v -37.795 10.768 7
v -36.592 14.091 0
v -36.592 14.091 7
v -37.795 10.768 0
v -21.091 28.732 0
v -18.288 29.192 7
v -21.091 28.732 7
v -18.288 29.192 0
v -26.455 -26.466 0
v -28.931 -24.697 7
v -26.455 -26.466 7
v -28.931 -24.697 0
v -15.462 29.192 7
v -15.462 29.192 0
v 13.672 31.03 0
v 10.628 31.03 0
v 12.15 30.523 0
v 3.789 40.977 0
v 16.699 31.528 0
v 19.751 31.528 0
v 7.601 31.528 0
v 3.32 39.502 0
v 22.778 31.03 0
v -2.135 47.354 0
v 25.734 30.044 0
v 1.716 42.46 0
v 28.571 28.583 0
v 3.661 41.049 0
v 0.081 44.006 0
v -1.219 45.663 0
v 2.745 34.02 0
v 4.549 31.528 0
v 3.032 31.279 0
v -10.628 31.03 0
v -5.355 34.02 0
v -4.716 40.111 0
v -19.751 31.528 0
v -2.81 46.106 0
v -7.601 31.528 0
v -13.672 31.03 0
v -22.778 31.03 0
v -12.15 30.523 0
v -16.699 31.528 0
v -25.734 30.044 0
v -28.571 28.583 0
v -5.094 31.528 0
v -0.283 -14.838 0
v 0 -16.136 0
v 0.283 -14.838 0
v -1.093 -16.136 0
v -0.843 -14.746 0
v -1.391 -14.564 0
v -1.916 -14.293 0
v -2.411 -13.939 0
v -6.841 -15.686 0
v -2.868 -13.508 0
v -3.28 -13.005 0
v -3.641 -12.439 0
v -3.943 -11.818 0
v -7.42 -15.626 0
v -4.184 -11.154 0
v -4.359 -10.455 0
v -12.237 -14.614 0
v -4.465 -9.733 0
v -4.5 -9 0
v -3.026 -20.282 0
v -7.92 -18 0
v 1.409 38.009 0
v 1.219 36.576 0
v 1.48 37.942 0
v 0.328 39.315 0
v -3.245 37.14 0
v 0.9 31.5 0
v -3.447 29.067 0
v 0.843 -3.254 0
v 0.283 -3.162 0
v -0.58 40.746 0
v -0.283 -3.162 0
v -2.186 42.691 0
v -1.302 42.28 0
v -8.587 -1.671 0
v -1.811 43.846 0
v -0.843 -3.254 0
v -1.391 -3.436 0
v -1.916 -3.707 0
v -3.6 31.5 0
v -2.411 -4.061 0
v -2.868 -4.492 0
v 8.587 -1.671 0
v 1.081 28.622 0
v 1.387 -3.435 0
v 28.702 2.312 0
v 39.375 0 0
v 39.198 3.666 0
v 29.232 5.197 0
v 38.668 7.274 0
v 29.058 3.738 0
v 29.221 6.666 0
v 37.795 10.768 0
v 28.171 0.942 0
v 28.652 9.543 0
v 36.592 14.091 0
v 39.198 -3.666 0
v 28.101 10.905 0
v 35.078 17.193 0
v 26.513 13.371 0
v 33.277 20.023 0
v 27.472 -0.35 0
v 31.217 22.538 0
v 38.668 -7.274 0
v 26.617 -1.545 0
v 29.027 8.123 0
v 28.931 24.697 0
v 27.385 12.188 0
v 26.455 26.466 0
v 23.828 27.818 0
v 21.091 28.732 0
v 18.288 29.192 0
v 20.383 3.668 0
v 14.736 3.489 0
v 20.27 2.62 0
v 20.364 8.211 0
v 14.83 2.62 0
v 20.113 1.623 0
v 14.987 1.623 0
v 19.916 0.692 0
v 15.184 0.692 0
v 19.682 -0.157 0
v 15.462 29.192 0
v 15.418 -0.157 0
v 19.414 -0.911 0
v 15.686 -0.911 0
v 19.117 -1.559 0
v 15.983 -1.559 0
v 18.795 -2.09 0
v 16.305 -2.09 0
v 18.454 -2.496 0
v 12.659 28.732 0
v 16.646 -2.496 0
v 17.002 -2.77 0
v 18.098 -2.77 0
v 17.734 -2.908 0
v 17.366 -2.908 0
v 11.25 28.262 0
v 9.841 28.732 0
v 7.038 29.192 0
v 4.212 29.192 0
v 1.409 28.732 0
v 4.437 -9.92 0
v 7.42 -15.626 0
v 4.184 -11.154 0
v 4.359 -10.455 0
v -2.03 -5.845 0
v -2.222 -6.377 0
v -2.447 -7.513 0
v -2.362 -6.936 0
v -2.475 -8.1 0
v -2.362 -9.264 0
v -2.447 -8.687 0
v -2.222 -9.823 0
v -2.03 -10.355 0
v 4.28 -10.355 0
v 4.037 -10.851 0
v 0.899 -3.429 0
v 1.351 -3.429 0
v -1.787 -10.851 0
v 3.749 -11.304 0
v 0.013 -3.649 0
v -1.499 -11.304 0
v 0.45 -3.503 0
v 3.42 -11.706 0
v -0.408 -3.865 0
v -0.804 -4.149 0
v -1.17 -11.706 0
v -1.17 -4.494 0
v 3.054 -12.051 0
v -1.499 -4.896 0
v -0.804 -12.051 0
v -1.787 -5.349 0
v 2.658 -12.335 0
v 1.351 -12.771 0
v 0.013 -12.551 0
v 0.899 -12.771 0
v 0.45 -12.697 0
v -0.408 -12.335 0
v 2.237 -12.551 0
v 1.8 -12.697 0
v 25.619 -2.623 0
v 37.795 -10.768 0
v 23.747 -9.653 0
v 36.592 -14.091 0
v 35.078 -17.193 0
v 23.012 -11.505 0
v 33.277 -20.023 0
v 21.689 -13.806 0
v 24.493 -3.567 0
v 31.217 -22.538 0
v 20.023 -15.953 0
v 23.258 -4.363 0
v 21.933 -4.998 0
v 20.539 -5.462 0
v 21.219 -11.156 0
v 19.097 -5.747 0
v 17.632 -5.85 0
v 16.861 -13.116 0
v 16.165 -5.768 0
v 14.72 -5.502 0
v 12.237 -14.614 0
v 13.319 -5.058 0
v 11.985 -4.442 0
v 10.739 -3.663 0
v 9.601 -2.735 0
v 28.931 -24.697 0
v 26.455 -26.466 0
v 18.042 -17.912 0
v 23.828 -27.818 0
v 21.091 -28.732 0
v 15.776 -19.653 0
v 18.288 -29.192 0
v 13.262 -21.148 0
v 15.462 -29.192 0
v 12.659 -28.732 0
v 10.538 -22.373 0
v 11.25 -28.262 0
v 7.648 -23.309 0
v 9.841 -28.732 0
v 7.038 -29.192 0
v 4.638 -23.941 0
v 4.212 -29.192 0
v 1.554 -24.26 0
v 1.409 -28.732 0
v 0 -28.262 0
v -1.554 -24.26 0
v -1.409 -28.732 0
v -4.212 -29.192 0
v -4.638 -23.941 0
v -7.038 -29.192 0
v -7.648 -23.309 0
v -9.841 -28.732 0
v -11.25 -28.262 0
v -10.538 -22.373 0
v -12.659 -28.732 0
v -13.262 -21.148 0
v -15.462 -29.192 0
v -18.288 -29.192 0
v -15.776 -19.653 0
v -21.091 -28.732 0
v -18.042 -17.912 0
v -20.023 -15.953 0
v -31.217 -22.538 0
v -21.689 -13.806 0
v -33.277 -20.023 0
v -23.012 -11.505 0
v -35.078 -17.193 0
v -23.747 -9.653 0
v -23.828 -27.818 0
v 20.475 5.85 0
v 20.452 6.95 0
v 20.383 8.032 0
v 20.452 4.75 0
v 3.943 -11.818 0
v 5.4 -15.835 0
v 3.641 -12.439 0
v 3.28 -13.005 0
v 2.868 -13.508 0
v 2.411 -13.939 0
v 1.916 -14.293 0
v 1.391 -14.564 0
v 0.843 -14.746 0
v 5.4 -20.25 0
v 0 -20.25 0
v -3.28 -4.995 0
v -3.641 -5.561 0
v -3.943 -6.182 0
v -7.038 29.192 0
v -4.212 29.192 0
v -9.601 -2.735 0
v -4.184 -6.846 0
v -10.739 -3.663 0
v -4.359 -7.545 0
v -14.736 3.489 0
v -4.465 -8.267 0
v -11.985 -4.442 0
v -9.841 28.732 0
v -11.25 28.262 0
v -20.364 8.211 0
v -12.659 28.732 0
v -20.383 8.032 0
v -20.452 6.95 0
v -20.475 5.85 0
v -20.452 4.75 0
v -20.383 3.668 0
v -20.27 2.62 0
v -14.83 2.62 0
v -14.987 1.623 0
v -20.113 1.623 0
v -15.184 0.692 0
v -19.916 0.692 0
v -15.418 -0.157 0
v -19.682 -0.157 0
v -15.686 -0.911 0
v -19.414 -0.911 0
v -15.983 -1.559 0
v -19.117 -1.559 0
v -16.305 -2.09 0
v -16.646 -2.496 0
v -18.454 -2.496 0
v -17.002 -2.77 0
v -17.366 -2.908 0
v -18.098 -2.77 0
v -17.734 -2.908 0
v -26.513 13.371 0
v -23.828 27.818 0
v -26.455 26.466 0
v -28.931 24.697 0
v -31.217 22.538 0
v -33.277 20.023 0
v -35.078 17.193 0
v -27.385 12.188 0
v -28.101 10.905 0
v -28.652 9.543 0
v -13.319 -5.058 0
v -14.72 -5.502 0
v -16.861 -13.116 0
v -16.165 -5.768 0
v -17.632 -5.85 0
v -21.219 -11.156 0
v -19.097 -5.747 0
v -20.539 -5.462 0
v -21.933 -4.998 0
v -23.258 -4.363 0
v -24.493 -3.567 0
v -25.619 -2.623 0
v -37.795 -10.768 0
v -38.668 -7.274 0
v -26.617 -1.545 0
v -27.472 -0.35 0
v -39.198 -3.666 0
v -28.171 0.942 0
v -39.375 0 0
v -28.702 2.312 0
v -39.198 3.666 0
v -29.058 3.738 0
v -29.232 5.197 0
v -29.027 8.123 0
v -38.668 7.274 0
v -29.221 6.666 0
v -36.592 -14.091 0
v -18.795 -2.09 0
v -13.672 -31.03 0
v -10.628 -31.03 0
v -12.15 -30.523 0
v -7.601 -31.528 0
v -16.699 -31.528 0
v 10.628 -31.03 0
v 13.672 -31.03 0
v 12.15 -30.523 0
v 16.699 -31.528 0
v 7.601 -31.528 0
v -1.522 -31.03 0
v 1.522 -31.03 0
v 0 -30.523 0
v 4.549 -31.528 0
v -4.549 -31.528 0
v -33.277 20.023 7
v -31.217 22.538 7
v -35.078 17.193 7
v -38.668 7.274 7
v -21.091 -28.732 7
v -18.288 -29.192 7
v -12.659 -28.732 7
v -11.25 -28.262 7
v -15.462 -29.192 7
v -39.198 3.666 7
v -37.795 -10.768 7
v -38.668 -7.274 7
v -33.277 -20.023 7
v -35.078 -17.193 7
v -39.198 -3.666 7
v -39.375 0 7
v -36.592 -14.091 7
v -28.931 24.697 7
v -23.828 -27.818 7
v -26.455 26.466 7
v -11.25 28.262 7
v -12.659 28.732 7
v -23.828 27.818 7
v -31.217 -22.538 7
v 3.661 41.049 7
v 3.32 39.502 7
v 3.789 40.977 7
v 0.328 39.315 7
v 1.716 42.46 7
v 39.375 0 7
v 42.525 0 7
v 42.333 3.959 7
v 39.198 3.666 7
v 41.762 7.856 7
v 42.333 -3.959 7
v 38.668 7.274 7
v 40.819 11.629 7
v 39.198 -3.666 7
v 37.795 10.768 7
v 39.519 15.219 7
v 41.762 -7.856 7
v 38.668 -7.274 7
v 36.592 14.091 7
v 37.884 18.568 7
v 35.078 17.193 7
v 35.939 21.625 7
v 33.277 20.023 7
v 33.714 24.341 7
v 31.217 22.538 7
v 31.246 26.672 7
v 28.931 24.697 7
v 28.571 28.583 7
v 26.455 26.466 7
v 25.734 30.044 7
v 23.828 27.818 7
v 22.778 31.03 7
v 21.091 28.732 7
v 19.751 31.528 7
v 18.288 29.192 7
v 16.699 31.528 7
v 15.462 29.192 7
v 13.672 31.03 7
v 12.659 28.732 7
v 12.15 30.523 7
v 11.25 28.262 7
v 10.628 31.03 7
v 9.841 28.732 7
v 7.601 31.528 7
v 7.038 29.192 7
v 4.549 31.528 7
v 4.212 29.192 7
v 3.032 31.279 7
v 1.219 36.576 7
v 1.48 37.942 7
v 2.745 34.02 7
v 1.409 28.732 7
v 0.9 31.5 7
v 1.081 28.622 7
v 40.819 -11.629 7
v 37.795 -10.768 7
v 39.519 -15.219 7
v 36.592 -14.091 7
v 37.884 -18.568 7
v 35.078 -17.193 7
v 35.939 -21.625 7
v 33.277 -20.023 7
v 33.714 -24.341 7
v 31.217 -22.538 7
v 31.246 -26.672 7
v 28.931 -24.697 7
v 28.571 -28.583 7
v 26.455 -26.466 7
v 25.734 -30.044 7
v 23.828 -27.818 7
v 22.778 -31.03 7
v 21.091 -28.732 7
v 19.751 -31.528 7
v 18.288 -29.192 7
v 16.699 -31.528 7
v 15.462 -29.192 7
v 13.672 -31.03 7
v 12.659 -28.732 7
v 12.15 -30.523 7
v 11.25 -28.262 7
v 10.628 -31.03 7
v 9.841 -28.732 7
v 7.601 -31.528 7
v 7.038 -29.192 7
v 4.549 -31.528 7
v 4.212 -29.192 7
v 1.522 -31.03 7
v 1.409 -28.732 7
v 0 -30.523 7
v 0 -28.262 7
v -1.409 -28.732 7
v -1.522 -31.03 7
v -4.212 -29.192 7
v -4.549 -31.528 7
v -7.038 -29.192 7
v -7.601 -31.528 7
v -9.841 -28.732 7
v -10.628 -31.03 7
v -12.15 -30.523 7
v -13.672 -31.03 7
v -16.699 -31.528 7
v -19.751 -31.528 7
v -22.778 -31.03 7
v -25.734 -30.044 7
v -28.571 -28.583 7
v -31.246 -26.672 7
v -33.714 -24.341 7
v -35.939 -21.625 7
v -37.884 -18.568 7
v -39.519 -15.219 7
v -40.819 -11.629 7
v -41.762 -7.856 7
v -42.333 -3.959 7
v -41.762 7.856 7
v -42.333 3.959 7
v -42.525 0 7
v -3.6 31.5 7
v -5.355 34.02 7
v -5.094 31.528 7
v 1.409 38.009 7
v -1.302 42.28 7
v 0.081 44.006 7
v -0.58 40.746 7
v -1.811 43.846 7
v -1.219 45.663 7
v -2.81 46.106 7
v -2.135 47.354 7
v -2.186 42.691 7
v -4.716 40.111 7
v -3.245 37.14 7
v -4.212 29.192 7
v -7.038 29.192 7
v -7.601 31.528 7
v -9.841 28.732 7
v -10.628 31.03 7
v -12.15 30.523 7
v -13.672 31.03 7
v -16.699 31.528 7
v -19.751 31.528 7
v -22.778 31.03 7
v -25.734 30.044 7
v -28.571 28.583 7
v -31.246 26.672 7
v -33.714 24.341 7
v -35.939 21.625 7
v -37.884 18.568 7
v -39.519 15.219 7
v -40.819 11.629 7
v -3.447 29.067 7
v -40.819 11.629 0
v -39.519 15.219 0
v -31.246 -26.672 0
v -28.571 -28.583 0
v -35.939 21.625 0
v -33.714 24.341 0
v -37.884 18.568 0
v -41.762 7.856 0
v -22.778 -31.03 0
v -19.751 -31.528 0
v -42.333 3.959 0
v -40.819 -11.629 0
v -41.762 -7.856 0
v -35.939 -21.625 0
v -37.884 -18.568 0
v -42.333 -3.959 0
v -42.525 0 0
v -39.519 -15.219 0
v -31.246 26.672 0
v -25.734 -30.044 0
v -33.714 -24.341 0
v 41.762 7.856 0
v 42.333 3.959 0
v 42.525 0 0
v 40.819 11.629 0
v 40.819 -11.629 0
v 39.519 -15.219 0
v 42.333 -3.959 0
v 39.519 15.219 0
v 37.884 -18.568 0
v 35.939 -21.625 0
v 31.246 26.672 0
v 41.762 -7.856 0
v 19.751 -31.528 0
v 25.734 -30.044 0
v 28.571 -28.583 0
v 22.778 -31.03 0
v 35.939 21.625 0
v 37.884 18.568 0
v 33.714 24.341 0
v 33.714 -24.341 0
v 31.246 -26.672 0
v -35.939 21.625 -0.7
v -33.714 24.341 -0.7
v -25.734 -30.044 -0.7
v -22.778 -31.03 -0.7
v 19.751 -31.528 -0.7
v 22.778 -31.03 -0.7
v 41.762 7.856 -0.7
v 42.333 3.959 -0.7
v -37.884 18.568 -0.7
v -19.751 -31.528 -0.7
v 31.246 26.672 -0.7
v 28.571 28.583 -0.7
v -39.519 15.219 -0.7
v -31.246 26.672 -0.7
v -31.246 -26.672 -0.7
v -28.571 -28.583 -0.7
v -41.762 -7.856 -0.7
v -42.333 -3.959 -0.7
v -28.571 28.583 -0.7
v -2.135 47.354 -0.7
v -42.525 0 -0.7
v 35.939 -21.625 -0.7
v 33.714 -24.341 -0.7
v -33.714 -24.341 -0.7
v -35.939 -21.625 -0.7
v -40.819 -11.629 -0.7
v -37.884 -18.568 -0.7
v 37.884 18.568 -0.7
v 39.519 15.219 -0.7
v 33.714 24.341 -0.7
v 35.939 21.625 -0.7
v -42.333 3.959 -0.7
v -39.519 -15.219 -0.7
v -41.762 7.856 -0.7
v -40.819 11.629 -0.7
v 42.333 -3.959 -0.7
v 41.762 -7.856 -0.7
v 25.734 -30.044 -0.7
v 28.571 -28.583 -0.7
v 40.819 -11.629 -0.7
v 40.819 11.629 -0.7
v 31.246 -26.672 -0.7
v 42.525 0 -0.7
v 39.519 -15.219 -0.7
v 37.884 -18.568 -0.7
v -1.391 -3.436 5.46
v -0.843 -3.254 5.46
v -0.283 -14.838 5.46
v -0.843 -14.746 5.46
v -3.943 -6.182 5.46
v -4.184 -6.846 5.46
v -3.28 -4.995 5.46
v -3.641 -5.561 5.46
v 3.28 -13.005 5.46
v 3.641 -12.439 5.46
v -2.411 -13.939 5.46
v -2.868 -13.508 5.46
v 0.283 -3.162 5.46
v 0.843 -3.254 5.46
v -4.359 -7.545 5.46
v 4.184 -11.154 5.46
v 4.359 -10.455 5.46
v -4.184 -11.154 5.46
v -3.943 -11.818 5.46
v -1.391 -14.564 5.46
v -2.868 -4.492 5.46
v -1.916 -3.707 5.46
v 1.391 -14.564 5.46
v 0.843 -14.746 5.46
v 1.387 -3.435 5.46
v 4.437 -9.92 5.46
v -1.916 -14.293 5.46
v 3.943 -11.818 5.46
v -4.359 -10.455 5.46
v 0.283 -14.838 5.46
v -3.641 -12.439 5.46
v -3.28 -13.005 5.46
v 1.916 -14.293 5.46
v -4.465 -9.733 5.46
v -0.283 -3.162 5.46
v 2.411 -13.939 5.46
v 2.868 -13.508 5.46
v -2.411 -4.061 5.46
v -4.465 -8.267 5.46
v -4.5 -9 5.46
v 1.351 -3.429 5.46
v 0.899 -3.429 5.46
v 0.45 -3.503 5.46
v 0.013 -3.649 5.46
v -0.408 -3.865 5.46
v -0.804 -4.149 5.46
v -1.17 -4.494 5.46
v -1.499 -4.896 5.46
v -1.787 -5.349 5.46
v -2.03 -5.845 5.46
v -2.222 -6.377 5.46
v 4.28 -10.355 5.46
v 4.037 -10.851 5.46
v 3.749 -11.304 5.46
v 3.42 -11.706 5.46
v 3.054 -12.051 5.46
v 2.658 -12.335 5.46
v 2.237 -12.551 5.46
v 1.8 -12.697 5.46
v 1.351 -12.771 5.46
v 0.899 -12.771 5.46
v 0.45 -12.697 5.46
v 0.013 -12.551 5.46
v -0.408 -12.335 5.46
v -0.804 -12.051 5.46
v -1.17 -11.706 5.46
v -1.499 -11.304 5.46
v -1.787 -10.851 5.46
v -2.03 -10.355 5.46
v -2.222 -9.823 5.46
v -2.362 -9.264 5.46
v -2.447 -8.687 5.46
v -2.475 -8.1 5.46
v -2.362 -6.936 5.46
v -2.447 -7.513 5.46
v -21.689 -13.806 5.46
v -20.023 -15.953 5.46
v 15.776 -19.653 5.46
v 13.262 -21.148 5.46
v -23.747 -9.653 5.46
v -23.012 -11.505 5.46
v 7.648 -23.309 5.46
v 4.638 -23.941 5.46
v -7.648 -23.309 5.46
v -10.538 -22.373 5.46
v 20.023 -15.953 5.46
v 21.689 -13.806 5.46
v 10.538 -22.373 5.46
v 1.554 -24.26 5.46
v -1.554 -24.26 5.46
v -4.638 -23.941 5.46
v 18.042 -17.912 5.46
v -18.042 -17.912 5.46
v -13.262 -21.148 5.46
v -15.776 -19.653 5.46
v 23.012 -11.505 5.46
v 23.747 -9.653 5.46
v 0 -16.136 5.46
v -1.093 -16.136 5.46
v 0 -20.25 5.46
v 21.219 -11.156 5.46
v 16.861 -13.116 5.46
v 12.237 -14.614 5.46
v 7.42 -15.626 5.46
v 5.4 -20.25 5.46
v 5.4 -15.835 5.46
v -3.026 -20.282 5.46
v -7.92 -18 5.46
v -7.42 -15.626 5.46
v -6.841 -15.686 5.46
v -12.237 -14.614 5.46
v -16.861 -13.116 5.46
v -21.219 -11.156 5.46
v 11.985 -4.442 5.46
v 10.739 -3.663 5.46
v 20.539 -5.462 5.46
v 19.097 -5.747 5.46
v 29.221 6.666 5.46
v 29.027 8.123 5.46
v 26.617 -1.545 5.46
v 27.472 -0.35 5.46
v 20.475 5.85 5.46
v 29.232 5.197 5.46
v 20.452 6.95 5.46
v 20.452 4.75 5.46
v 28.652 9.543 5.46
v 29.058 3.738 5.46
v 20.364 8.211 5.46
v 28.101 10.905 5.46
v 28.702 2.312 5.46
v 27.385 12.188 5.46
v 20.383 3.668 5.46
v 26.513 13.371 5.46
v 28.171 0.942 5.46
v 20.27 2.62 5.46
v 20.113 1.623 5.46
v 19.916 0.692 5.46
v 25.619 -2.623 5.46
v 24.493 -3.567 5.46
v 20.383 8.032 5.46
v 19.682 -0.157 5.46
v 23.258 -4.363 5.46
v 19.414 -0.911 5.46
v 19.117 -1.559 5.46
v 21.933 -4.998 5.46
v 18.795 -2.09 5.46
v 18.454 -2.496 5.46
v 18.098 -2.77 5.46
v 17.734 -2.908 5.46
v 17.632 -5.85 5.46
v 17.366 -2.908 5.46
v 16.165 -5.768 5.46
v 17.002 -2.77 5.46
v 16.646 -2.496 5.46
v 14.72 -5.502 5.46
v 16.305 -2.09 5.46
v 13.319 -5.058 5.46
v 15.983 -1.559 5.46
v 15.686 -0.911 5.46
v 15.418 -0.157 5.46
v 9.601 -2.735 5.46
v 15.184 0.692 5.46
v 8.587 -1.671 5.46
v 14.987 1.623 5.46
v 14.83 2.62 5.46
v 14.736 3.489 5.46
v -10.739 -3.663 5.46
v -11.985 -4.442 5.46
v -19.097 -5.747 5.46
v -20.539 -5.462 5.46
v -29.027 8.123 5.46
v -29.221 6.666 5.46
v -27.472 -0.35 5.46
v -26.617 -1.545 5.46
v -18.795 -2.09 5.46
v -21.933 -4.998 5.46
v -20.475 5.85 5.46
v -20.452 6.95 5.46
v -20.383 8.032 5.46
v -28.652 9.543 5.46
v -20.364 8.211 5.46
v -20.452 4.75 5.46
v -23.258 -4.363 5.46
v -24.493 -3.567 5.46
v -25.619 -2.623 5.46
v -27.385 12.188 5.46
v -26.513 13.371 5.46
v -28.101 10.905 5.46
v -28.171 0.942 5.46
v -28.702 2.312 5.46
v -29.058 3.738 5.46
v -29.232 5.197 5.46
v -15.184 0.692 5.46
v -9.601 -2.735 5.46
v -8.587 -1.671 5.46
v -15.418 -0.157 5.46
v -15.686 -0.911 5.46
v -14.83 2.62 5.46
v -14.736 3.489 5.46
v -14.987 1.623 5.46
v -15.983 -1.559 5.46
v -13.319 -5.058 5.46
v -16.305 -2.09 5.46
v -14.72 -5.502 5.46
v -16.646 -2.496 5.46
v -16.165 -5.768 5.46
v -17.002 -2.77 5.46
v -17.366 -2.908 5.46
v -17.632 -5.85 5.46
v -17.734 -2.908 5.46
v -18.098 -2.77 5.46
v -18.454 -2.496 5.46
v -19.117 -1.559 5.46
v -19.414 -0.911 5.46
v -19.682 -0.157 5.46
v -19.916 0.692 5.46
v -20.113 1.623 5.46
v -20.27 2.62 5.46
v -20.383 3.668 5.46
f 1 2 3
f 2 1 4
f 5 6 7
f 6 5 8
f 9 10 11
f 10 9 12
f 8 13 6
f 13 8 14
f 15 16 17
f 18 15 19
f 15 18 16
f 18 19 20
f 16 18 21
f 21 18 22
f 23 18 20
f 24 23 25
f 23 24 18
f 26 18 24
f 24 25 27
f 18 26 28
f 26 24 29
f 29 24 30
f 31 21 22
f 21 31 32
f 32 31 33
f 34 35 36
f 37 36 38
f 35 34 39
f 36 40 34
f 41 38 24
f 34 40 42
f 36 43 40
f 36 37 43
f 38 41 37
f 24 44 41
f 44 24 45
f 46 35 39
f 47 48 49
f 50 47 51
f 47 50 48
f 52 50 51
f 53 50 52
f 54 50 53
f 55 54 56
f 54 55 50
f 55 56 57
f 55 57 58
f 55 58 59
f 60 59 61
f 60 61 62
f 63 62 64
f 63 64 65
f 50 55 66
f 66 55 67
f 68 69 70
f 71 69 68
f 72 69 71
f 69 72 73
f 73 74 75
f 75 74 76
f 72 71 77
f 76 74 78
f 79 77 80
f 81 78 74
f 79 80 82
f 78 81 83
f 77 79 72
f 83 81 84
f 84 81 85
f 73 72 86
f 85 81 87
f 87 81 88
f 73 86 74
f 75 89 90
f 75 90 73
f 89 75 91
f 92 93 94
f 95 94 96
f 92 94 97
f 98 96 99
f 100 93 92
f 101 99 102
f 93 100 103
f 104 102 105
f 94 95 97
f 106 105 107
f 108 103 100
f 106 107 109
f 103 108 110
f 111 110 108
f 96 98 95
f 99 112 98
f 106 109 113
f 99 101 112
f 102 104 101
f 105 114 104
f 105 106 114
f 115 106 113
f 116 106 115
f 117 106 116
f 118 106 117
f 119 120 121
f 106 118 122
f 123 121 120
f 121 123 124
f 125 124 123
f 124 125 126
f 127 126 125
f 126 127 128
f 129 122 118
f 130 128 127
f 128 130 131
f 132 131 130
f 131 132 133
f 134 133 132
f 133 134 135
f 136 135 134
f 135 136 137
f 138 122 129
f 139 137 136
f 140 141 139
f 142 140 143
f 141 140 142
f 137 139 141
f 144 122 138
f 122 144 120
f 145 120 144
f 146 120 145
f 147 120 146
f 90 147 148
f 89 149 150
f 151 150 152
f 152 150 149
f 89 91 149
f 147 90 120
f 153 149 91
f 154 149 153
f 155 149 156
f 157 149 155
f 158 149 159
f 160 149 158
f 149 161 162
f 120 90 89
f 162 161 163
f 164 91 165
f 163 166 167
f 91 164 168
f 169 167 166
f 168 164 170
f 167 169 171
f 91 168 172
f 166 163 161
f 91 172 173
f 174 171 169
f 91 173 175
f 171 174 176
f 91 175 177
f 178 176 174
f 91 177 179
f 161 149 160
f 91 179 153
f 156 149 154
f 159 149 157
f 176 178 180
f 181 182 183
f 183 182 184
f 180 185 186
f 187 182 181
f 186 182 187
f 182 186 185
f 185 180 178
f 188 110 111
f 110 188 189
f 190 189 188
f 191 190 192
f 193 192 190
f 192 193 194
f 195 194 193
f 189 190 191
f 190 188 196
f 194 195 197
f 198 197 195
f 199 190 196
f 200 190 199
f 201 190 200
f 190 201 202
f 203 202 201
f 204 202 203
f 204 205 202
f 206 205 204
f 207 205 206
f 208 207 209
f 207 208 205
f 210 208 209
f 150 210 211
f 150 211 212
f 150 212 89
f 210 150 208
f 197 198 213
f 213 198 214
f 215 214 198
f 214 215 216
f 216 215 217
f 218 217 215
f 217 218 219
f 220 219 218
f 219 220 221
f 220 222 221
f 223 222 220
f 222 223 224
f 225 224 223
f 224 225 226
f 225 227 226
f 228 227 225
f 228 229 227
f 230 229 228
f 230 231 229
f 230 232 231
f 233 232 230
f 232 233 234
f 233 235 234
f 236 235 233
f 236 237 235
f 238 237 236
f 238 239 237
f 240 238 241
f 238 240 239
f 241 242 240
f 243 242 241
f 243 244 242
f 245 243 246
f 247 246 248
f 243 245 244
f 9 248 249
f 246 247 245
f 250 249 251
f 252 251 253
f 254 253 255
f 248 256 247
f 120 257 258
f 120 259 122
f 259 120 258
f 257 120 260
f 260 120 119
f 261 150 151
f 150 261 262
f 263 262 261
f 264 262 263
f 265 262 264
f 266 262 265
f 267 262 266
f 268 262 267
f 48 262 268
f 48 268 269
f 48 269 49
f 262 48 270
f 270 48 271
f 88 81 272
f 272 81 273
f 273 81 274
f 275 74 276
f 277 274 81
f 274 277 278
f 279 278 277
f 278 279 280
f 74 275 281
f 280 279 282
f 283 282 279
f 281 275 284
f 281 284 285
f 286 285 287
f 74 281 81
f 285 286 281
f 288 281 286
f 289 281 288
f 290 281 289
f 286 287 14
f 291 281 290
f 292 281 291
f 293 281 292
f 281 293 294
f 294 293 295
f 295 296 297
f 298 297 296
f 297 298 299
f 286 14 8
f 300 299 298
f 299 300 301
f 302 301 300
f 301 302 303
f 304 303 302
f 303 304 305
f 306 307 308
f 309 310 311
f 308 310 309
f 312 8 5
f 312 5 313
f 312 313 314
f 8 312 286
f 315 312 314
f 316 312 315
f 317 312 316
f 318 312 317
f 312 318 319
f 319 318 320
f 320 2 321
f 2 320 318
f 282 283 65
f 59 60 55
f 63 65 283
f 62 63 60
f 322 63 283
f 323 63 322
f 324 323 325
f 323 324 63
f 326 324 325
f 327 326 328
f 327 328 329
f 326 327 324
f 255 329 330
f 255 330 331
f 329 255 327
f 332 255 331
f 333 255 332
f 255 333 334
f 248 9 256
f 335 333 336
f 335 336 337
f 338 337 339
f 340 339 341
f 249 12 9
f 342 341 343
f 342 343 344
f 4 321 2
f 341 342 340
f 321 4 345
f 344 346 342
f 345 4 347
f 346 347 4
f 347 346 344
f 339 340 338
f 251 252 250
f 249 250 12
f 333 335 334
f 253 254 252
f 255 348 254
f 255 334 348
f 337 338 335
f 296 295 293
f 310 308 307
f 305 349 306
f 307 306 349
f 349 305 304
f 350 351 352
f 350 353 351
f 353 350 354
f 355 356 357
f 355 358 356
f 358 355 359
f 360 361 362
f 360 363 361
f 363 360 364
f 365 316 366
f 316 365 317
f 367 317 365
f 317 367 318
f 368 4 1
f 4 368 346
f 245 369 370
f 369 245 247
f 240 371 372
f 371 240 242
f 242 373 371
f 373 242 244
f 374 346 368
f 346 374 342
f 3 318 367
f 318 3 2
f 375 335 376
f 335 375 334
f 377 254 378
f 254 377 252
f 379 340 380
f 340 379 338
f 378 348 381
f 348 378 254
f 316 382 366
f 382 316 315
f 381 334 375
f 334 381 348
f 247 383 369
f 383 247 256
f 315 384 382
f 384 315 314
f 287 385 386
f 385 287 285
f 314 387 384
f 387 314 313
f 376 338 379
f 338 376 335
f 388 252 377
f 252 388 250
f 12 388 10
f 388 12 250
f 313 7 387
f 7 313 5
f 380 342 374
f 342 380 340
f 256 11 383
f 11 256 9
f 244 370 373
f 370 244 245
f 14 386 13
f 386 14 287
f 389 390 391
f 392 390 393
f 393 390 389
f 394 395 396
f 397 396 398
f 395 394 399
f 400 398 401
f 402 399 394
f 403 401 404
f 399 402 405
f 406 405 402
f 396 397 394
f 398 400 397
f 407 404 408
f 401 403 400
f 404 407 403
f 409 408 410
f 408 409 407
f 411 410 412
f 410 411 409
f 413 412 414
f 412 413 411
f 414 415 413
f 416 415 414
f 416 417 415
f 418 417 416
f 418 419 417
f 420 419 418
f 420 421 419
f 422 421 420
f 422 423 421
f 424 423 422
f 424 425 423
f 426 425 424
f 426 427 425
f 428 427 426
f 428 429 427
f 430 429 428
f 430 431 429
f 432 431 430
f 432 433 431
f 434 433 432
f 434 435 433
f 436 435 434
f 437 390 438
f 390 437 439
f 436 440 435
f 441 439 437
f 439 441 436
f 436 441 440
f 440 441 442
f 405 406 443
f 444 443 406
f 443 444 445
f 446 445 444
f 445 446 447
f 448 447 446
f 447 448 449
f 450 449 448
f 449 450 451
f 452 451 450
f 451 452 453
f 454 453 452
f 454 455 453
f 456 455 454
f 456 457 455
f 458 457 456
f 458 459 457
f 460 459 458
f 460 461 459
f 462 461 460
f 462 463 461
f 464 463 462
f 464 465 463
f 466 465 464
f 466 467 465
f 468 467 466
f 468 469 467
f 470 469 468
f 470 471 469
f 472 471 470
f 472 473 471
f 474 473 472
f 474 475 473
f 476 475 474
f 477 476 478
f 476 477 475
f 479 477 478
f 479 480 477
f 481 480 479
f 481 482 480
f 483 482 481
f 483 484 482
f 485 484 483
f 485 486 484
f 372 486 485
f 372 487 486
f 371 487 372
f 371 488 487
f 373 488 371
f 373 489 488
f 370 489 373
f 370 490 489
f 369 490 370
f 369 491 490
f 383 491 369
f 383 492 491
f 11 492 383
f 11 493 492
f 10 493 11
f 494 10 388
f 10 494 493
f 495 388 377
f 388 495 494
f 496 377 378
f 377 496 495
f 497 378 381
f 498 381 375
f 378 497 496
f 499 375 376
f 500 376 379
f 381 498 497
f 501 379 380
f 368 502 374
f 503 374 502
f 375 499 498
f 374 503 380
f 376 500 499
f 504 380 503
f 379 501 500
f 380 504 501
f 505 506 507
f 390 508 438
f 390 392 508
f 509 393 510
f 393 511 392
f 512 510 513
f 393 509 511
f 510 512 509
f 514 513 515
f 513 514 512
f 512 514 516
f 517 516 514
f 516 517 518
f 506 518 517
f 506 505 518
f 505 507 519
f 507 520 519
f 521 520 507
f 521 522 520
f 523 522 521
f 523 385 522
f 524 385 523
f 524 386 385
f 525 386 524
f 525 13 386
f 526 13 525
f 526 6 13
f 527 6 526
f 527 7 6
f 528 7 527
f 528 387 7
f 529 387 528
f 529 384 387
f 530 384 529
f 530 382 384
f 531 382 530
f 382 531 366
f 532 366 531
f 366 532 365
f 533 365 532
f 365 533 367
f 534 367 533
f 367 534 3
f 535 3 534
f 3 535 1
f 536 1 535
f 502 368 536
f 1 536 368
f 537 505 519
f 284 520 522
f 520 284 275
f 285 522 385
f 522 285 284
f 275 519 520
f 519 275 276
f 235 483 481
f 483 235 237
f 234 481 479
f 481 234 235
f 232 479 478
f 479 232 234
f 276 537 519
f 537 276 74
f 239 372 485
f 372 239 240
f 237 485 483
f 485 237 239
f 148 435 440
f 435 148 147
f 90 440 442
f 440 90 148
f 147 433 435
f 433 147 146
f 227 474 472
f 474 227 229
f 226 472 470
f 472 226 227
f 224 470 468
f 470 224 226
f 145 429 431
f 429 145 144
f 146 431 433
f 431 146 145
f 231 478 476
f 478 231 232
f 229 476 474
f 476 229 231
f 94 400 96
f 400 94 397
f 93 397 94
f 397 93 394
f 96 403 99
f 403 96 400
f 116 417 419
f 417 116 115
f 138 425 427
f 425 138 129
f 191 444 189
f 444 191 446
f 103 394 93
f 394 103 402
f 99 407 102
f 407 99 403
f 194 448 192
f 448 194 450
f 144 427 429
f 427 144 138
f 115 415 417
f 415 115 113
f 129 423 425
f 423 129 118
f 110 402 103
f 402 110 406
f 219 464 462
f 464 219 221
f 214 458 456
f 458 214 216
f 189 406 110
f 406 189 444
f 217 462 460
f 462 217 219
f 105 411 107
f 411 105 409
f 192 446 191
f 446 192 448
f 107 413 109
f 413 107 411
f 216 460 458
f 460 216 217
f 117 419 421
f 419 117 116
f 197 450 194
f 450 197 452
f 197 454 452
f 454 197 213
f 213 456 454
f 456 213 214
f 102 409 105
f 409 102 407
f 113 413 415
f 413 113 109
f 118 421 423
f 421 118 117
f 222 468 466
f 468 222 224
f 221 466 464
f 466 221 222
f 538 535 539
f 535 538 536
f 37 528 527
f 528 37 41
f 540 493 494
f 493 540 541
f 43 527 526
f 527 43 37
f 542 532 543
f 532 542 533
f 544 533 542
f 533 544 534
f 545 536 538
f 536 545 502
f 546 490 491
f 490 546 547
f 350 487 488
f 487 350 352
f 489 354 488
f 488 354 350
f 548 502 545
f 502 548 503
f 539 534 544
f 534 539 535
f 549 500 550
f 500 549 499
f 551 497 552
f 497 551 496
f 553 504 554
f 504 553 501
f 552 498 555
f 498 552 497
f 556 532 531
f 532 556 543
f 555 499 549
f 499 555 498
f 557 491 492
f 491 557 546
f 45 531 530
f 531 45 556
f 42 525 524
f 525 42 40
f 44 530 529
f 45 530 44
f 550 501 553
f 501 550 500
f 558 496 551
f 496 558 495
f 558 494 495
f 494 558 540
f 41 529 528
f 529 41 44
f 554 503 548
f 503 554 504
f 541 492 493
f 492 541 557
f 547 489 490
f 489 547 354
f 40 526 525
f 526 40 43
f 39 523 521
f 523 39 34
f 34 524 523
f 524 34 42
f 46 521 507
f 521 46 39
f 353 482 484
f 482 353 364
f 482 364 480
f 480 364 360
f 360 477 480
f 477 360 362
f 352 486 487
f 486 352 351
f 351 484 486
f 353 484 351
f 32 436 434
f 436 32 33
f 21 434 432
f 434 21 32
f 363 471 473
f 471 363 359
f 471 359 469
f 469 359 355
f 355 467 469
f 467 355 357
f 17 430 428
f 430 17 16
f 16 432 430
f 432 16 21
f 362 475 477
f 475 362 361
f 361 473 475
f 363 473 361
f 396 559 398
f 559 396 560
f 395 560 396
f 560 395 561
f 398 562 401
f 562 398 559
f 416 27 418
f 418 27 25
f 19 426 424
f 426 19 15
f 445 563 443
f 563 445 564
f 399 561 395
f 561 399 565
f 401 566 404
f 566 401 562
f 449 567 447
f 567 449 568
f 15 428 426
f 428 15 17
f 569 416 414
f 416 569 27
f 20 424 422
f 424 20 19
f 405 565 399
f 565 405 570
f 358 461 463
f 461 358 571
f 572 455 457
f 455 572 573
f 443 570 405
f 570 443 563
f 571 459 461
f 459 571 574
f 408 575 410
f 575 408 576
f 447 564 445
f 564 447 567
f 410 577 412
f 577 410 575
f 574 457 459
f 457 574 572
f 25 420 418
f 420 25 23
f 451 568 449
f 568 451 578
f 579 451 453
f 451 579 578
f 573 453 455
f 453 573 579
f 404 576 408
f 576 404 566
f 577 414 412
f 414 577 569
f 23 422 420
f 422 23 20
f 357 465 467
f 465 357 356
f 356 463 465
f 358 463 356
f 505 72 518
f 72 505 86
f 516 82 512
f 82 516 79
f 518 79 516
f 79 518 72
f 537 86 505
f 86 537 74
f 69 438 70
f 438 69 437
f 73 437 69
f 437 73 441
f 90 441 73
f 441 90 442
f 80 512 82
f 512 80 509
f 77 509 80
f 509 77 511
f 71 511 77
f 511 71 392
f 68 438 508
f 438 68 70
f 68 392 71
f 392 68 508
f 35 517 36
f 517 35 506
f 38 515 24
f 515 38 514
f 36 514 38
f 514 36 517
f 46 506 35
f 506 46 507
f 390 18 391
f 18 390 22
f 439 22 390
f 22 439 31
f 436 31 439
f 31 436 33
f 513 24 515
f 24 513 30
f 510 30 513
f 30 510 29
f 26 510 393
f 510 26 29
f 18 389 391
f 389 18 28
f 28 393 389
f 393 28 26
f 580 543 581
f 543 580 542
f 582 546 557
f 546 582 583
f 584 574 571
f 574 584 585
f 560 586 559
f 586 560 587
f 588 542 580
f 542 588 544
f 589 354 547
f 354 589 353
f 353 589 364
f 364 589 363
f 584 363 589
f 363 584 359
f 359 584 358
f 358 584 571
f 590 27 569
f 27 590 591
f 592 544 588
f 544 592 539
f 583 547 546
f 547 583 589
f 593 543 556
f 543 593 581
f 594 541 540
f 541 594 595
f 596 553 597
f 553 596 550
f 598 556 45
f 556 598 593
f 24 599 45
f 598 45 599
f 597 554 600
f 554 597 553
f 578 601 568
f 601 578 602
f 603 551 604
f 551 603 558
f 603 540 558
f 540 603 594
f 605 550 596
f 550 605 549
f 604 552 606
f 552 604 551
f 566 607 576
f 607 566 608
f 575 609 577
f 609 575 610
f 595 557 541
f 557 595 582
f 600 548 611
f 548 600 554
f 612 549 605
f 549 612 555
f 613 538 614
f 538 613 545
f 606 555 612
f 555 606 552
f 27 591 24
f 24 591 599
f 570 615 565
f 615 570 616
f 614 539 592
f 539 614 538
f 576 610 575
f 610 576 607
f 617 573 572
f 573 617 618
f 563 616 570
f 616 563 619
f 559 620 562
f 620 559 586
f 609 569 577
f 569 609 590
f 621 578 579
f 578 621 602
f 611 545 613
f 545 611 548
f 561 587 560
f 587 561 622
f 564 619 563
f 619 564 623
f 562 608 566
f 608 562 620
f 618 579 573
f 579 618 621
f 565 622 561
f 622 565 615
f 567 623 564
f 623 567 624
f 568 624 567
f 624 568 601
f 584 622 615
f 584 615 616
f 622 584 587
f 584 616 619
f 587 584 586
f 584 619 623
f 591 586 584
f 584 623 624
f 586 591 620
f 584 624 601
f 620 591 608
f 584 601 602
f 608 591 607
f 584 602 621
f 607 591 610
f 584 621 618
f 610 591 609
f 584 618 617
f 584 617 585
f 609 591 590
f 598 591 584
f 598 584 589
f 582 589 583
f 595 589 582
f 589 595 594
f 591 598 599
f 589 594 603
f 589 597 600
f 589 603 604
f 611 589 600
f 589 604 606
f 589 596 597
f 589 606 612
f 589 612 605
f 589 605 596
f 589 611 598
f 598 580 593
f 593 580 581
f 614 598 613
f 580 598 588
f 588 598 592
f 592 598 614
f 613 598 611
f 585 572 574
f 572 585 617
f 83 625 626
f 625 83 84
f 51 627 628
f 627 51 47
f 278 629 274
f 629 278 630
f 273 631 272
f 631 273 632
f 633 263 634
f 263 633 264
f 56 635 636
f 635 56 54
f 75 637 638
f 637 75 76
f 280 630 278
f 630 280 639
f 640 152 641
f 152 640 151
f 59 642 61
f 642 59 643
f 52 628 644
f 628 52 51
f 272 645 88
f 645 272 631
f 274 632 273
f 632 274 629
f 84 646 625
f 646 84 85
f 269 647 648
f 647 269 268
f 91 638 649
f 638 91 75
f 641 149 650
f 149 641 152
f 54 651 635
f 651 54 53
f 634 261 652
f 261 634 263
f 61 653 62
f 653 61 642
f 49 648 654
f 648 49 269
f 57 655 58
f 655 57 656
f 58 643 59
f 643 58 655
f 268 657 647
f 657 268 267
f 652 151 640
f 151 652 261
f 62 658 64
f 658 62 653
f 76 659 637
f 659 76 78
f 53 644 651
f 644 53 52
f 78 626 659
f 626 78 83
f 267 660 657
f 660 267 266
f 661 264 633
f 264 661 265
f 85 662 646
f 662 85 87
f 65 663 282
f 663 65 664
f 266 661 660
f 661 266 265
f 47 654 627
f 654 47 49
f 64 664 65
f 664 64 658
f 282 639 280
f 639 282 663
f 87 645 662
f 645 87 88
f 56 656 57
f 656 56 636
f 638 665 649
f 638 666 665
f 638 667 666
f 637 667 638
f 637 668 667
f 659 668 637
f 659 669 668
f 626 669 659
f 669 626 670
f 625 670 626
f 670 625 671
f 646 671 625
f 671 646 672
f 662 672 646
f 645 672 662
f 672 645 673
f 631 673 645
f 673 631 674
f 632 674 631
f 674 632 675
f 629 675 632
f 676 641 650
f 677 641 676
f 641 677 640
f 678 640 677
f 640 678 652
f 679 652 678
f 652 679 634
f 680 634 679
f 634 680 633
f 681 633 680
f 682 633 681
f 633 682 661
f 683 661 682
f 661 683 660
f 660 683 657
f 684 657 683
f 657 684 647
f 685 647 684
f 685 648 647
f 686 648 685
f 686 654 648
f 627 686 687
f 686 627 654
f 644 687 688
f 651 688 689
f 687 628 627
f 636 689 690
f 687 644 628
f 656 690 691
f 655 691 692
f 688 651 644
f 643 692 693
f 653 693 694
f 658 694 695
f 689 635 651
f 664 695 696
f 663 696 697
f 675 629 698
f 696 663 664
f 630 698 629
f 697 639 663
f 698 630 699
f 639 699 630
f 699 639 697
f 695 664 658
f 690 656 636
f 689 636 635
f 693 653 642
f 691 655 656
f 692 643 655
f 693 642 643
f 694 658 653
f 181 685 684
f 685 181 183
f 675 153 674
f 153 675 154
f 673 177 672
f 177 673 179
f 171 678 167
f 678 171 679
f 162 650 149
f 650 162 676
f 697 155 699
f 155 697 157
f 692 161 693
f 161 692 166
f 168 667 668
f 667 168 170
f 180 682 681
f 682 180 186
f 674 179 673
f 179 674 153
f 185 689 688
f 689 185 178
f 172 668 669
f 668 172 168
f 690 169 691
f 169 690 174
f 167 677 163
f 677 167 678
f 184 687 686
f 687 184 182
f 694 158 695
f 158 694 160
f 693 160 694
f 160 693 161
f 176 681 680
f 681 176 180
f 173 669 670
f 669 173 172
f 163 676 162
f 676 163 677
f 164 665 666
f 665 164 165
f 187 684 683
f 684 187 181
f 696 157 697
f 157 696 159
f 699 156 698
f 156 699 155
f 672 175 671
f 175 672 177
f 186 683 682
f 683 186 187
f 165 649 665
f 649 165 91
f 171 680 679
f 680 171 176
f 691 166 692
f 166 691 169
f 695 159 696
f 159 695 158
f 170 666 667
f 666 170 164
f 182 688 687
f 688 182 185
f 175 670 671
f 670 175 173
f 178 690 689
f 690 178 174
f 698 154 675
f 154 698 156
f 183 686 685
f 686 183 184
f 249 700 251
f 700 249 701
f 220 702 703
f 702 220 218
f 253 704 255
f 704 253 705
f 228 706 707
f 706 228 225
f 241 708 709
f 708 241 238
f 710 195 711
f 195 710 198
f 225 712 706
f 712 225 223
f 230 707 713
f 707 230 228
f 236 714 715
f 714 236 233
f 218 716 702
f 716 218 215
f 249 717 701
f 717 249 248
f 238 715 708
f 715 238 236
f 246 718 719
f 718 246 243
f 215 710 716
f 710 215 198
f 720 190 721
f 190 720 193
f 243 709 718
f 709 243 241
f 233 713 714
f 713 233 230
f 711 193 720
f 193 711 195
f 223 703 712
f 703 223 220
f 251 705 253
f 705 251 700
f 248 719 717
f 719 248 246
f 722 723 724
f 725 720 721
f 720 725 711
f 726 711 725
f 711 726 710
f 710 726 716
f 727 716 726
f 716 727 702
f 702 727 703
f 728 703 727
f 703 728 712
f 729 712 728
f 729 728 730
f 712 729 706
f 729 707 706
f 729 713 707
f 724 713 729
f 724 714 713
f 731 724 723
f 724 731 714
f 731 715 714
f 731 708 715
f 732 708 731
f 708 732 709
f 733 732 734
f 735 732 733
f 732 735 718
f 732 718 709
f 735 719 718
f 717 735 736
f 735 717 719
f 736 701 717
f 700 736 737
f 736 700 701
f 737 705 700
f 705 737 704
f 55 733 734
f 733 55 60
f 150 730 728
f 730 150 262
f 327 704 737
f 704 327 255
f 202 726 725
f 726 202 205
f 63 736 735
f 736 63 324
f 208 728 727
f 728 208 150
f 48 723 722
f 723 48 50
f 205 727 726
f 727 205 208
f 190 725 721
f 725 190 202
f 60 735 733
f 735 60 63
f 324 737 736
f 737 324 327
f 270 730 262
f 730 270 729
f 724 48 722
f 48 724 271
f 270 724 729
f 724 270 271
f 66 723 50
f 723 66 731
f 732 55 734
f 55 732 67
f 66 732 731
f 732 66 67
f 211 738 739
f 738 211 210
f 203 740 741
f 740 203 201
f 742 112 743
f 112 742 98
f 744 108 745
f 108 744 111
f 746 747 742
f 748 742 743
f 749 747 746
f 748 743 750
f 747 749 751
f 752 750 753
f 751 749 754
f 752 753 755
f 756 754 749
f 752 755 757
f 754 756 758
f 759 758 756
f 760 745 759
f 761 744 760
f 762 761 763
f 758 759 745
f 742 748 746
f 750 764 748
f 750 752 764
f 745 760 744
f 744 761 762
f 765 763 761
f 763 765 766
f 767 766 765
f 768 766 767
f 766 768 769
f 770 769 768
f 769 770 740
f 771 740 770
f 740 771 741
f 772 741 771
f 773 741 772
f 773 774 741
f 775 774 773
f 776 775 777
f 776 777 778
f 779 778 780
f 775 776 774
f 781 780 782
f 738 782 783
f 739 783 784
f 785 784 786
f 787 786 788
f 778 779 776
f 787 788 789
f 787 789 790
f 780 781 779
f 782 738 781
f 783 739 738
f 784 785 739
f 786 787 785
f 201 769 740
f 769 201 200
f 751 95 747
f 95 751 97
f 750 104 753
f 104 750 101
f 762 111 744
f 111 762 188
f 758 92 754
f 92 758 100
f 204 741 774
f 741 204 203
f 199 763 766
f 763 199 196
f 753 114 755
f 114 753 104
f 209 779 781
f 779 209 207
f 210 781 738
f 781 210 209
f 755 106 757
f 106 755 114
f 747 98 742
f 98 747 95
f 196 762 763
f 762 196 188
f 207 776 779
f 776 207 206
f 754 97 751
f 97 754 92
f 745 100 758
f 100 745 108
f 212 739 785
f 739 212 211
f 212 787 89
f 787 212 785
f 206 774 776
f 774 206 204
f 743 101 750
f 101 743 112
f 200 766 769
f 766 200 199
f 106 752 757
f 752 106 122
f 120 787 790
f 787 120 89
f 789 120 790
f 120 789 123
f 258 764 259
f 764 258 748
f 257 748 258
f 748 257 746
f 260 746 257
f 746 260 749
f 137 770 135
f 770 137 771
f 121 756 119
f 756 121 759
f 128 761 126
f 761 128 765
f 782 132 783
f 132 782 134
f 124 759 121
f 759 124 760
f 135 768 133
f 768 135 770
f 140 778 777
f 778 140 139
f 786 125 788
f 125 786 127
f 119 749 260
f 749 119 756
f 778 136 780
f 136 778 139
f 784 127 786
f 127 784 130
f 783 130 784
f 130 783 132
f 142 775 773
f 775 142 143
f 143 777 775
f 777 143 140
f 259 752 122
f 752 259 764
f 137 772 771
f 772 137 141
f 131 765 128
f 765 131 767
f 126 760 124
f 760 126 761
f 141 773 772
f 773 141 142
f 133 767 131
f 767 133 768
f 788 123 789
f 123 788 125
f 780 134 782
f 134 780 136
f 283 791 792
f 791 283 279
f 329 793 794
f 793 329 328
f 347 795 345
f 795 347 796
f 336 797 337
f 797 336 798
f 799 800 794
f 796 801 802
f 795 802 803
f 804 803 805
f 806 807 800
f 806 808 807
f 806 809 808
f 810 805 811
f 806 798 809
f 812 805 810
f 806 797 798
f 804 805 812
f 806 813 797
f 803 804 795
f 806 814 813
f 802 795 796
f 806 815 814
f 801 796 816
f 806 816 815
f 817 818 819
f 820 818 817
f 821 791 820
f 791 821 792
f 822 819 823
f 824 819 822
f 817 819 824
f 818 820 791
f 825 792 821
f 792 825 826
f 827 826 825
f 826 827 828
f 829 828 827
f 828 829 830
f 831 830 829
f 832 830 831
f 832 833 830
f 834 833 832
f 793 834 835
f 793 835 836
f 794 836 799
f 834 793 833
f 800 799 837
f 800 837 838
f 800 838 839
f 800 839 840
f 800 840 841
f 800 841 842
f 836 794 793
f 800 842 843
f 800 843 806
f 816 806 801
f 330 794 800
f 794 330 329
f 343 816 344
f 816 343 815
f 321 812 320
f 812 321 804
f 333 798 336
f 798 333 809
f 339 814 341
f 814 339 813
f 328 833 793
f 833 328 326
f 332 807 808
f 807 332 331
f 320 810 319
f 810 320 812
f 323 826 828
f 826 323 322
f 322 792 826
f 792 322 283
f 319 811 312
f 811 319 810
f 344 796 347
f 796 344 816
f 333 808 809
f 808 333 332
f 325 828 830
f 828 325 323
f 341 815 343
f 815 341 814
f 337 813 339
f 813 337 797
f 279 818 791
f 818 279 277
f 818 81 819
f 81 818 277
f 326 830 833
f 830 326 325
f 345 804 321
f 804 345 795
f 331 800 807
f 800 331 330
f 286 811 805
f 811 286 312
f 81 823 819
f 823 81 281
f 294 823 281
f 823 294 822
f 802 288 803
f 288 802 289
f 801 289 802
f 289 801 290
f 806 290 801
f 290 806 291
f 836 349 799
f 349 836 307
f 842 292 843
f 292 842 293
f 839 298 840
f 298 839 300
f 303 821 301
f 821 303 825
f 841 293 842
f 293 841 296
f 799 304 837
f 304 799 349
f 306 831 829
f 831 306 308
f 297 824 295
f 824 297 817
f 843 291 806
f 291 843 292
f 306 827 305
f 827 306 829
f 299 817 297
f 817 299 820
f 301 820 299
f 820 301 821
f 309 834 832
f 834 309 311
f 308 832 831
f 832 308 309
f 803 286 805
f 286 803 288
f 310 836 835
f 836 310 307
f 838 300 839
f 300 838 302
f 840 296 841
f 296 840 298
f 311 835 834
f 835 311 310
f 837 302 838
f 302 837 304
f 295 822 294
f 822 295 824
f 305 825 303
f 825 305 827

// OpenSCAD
//Corpo_(Body)
corpo_body="abobora_pumpkin"; //[fantasma_ghost, abobora_pumpkin, caveira_skull]

//Nariz_(Nose)
nariz_nose="redondo_round"; //[triangulo_triangle, redondo_round, cobra_snake, nenhum_none]

//Boca_(Mouth)
boca_mouth="dentes_teeth"; //[sorriso_smile, dentes_teeth, quadrados_squares, O]

//Olhos_eyes
olhos_eyes="bravo_angry"; //[bravo_angry, alegre_happy, triste_sad, curioso_curious]

//Quality
$fn=50; //[10:100]

render(){
scale ([0.45,0.45,0.7]){
union(){
//Fantasma contorno
if(corpo_body=="fantasma_ghost"){ 
        scale([0.8,0.9,1]){
        difference(){
            scale ([1.08,1.08,1]){
                hull(){
                    union(){
                        cylinder (10,r=90,center=false);
                        translate ([-90,-90,0]){
                            cube ([180,90,10]);
                        }
                        for (i=[0:1:8]){
                            translate ([20*i,0,0]){
                                translate ([-80,-90,0]){
                                    cylinder (10,r=10,center=false);
                                }
                            }
                        }
                    }
                }
            }
            union(){
                cylinder (10,r=90,center=false);
                translate ([-90,-90,0]){
                    cube ([180,90,10]);
                }
                for (i=[0:1:8]){
                    translate ([20*i,0,0]){
                        translate ([-80,-90,0]){
                            cylinder (10,r=10,center=false);
                        }
                    }
                }
            }
        }

    }
    hull(){
    scale([1,1,0.1]){
        translate([0,0,-10]){
                    scale([0.8,0.9,1]){
        difference(){
            scale ([1.08,1.08,1]){
                hull(){
                    union(){
                        cylinder (10,r=90,center=false);
                        translate ([-90,-90,0]){
                            cube ([180,90,10]);
                        }
                        for (i=[0:1:8]){
                            translate ([20*i,0,0]){
                                translate ([-80,-90,0]){
                                    cylinder (10,r=10,center=false);
                                }
                            }
                        }
                    }
                }
            }
            union(){
                cylinder (10,r=90,center=false);
                translate ([-90,-90,0]){
                    cube ([180,90,10]);
                }
                for (i=[0:1:8]){
                    translate ([20*i,0,0]){
                        translate ([-80,-90,0]){
                            cylinder (10,r=10,center=false);
                        }
                    }
                }
            }
        }

    }
            
    }
}
}
}









//abobora contorno
else if (corpo_body=="abobora_pumpkin"){
    union(){
        difference(){
            difference (){
                scale ([1.08,1.08,1]){
                    scale ([1,1.3,1]){
                        translate ([-62.5,0,0]){
                            union(){
                                for (i=[1:1:4]){
                                    translate ([25*i,0,0]){
                                        cylinder (10,r=50, center=false);
                                    }
                                }
                            }
                        }
                    }
                }
                scale ([1,1.3,1]){
                    translate ([-62.5,0,0]){
                        union(){
                            for (i=[1:1:4]){
                                translate ([25*i,0,0]){
                                    cylinder (10,r=50, center=false);
                                }
                            }
                        }
                    }
                }
            }
            difference (){
                difference(){
                    difference (){
                        translate ([92,70,0]){
                            difference (){
                                cylinder (10,r=100,center=false);
                                cylinder (10,r=90,center=false);
                            }
                        }
                        scale ([1,1.3,1]){
                            translate ([-62.5,0,0]){
                                union(){
                                    for (i=[1:1:4]){
                                        translate ([25*i,0,0]){
                                            cylinder (10,r=50, center=false);
                                        }
                                    }
                                }
                            }
                        }
                    }
                    translate ([10,-100,0]){
                        cube ([400,300,10]);
                    }
                }
                translate ([25,105,0]){
                    cylinder (10, r=30, center=false);
                }
            }
        }
        difference(){ 
                translate ([2.5,0,0]){
                scale ([1.8,1.08,1]){
                    difference (){
                    difference(){
                        difference (){
                            translate ([92,70,0]){
                                difference (){
                                    cylinder (10,r=100,center=false);
                                    cylinder (10,r=90,center=false);
                                }
                            }
                            scale ([1,1.3,1]){
                                translate ([-62.5,0,0]){
                                    union(){
                                        for (i=[1:1:4]){
                                            translate ([25*i,0,0]){
                                                cylinder (10,r=50, center=false);
                                            }
                                        }
                                    }
                                }
                            }
                        }
                        translate ([10,-100,0]){
                            cube ([400,300,10]);
                        }
                    }
                    translate ([25,105,0]){
                        cylinder (10, r=30, center=false);
                    }
                }
            }
        }

        difference (){
            difference(){
                difference (){
                    translate ([92,70,0]){
                        difference (){
                            cylinder (10,r=100,center=false);
                                cylinder (10,r=90,center=false);
                        }
                    }
                    scale ([1,1.3,1]){
                        translate ([-62.5,0,0]){
                            union(){
                                for (i=[1:1:4]){
                                    translate ([25*i,0,0]){
                                        cylinder (10,r=50, center=false);
                                    }
                                }
                            }
                        }
                    }
                }
                translate ([10,-100,0]){
                    cube ([400,300,10]);
                }
            }
            translate ([25,105,0]){
                cylinder (10, r=30, center=false);
            }
        }
    }
}
hull(){
    scale([1,1,0.1]){
        translate([0,0,-10]){
                union(){
        difference(){
            difference (){
                scale ([1.08,1.08,1]){
                    scale ([1,1.3,1]){
                        translate ([-62.5,0,0]){
                            union(){
                                for (i=[1:1:4]){
                                    translate ([25*i,0,0]){
                                        cylinder (10,r=50, center=false);
                                    }
                                }
                            }
                        }
                    }
                }
                scale ([1,1.3,1]){
                    translate ([-62.5,0,0]){
                        union(){
                            for (i=[1:1:4]){
                                translate ([25*i,0,0]){
                                    cylinder (10,r=50, center=false);
                                }
                            }
                        }
                    }
                }
            }
            difference (){
                difference(){
                    difference (){
                        translate ([92,70,0]){
                            difference (){
                                cylinder (10,r=100,center=false);
                                cylinder (10,r=90,center=false);
                            }
                        }
                        scale ([1,1.3,1]){
                            translate ([-62.5,0,0]){
                                union(){
                                    for (i=[1:1:4]){
                                        translate ([25*i,0,0]){
                                            cylinder (10,r=50, center=false);
                                        }
                                    }
                                }
                            }
                        }
                    }
                    translate ([10,-100,0]){
                        cube ([400,300,10]);
                    }
                }
                translate ([25,105,0]){
                    cylinder (10, r=30, center=false);
                }
            }
        }
        difference(){ 
                translate ([2.5,0,0]){
                scale ([1.8,1.08,1]){
                    difference (){
                    difference(){
                        difference (){
                            translate ([92,70,0]){
                                difference (){
                                    cylinder (10,r=100,center=false);
                                    cylinder (10,r=90,center=false);
                                }
                            }
                            scale ([1,1.3,1]){
                                translate ([-62.5,0,0]){
                                    union(){
                                        for (i=[1:1:4]){
                                            translate ([25*i,0,0]){
                                                cylinder (10,r=50, center=false);
                                            }
                                        }
                                    }
                                }
                            }
                        }
                        translate ([10,-100,0]){
                            cube ([400,300,10]);
                        }
                    }
                    translate ([25,105,0]){
                        cylinder (10, r=30, center=false);
                    }
                }
            }
        }

        difference (){
            difference(){
                difference (){
                    translate ([92,70,0]){
                        difference (){
                            cylinder (10,r=100,center=false);
                                cylinder (10,r=90,center=false);
                        }
                    }
                    scale ([1,1.3,1]){
                        translate ([-62.5,0,0]){
                            union(){
                                for (i=[1:1:4]){
                                    translate ([25*i,0,0]){
                                        cylinder (10,r=50, center=false);
                                    }
                                }
                            }
                        }
                    }
                }
                translate ([10,-100,0]){
                    cube ([400,300,10]);
                }
            }
            translate ([25,105,0]){
                cylinder (10, r=30, center=false);
            }
        }
    }
}
        }
    }
}
}


//Corpo Gato
else if (corpo_body=="gato"){
translate([0,25,0]){
scale([0.85,0.75,1]){
    difference(){
        translate([0,10,0]){
    scale ([1.08,1.12,1]){
    union(){
    difference() {
    cylinder (10,r=110, center=false);
    translate ([-110,0,0]){
    cube ([220,200,10], center=false);
    }
    }
    mirror(v=[1,0,0]){
   linear_extrude (10,center=false){
    polygon (points=[[65,0],[82.5,45],[105,0]], convexity=10);
    }   
}
   linear_extrude (10,center=false){
    polygon (points=[[65,0],[82.5,45],[105,0]], convexity=10);
    }
    }
}
}
  union(){
    difference() {
    cylinder (10,r=110, center=false);
    translate ([-110,0,0]){
    cube ([220,200,10], center=false);
    }
    }
    mirror(v=[1,0,0]){
   linear_extrude (10,center=false){
    polygon (points=[[70,0],[90,50],[110,0]], convexity=10);
    }   
}
   linear_extrude (10,center=false){
    polygon (points=[[70,0],[90,50],[110,0]], convexity=10);
    }
    }
}
}
}
}
    
 
//Corpo caveira
else if (corpo_body=="caveira_skull"){
difference(){
    translate([0,-1.5,0]){
scale([1.08,1.08,1]){
    union(){
    union(){
    difference(){
    cylinder (10,r=90, center=false);
    translate ([-90,-100,0]){
    cube([180,90,10], center=false);
        
}
}
translate ([-42,0,0]){
cylinder (10,r=50,center=false);
}
mirror (1,0,0){
translate ([-42,0,0]){
cylinder (10,r=50,center=false);
}
}
}
translate([-40,-80,0]){
cube([80,80,10],center=false);
}
}
}
}
    union(){
    union(){
    difference(){
    cylinder (10,r=90, center=false);
    translate ([-90,-100,0]){
    cube([180,90,10], center=false);
        
}
}
translate ([-42,0,0]){
cylinder (10,r=50,center=false);
}
mirror (1,0,0){
translate ([-42,0,0]){
cylinder (10,r=50,center=false);
}
}
}
translate([-40,-80,0]){
cube([80,80,10],center=false);
}
}
}
hull(){
    scale([1,1,0.1]){
        translate([0,0,-10]){
            difference(){
    translate([0,-1.5,0]){
scale([1.08,1.08,1]){
    union(){
    union(){
    difference(){
    cylinder (10,r=90, center=false);
    translate ([-90,-100,0]){
    cube([180,90,10], center=false);
        
}
}
translate ([-42,0,0]){
cylinder (10,r=50,center=false);
}
mirror (1,0,0){
translate ([-42,0,0]){
cylinder (10,r=50,center=false);
}
}
}
translate([-40,-80,0]){
cube([80,80,10],center=false);
}
}
}
}
    union(){
    union(){
    difference(){
    cylinder (10,r=90, center=false);
    translate ([-90,-100,0]){
    cube([180,90,10], center=false);
        
}
}
translate ([-42,0,0]){
cylinder (10,r=50,center=false);
}
mirror (1,0,0){
translate ([-42,0,0]){
cylinder (10,r=50,center=false);
}
}
}
translate([-40,-80,0]){
cube([80,80,10],center=false);
}
}
}
        }
    }
}
}

scale([1,1,0.78]){
//Nariz triangulo
if (nariz_nose=="triangulo_triangle"){
    difference(){
   linear_extrude (10,center=false){
       offset(r=3){
    polygon (points=[[-10,-25],[0,-5],[10,-25]], convexity=10);
    }
}
   linear_extrude (10,center=false){
      
    polygon (points=[[-10,-25],[0,-5],[10,-25]], convexity=10);
   }
}
    }

//Nariz redondo
else if (nariz_nose=="redondo_round"){
    translate ([0,-20,0]){
        difference(){
            
            scale([1,1.3,1]){
            cylinder (10,r=10,center=false);
        }
        translate([2.5,2,0]){
        scale([0.8,0.8,1]){
        scale([1,1.3,1]){
            cylinder (10,r=10,center=false);
        }
    }
    }
    }
}
    
}

//Nariz retangulo
else if (nariz_nose=="retangulo"){
    difference(){
   linear_extrude (10,center=false){
       offset(r=3){
    polygon (points=[[-5,-25],[-5,-5],[5,-5],[5,-25]], convexity=10);
    }
}
   linear_extrude (10,center=false){
      
    polygon (points=[[-5,-25],[-5,-5],[5,-5],[5,-25]], convexity=10);
   }
}
    }

//Nariz fendas
    else if (nariz_nose=="cobra_snake"){
    mirror([1,0,0]){
   linear_extrude (10,center=false){
       offset(r=1){
    polygon (points=[[-7,-25],[-7,-5],[-5.5,-5],[-5.5,-25]], convexity=10);
    }
}
}
 linear_extrude (10,center=false){
       offset(r=1){
    polygon (points=[[-7,-25],[-7,-5],[-5.5,-5],[-5.5,-25]], convexity=10);
    }
}
}

//Boca sorriso
if (boca_mouth=="sorriso_smile"){
    scale([1.1,0.9,1]){
    difference(){
    translate ([0,-10,0]){
    cylinder (10,r=50, center=false);
    }        
    translate ([0,40,0]){
    cylinder (10,r=80, center=false);
    }
}

}
}

//boca dentuco
else if (boca_mouth=="dentes_teeth"){
    difference(){
    difference(){
    scale([1.1,0.9,1]){
    difference(){
    translate ([0,-10,0]){
    cylinder (10,r=50, center=false);
    }        
    translate ([0,40,0]){
    cylinder (10,r=80, center=false);
    }
}

}
translate ([0,-45,0]){
cube ([12,10,10],center=false);
}
}

translate ([-17.6,-40,0]){
    rotate([0,0,-25]){
cube ([12,20,10],center=false);
}
}
}
}


//boca reta
else if (boca_mouth=="quadrados_squares"){
    translate([-24,0,0]){
    for (i=[0:1:4]){
        translate([12*i,0,0]){
     linear_extrude (10,center=false){
       offset(r=1){
    polygon (points=[[-3,-58],[-3,-40],[3,-40],[3,-58]], convexity=10);
    }
}
}
}
}
}
//boca redonda
else if (boca_mouth=="O") {
translate ([10,-45,0]){
    difference(){
    scale ([0.6,0.9,1]){
        cylinder (10,r=15,center=false);
}
scale([0.7,0.7,1]){
    scale ([0.5,1,1]){
        cylinder (10,r=15,center=false);
}
}
    }
}
}
//olho bravo
if (olhos_eyes=="bravo_angry"){
    
    mirror([1,0,0]){
        scale([1.3,1.3,1]){
    translate ([30,10,0]){
    difference(){
    rotate ([0,0,40]){
    difference(){
            cylinder (10,r=20,center=false);
        translate ([-40,0,0]){
            cube ([80,40,10]);
        }

    }
}

    scale ([1,3,1]){
    cylinder (10,r=5,center=false);
    }
}
}
}
}
 scale([1.3,1.3,1]){
    translate ([30,10,0]){
    difference(){
    rotate ([0,0,40]){
    difference(){
            cylinder (10,r=20,center=false);
        translate ([-40,0,0]){
            cube ([80,40,10]);
        }

    }
}

    scale ([1,3,1]){
    cylinder (10,r=5,center=false);
    }
}
}
}
}
//olho alegre
else if (olhos_eyes=="alegre_happy"){
    translate([30,5,0]){
        scale([1.2,1.2,1]){
    difference(){
    difference(){
    scale([0.7,1,1]){
    cylinder (10,r=20);
       }
       translate([0,-50,0]){
       cylinder(10,r=40);
}
}
translate([-3,-5,0]){
scale([0.5,1,1]){
    cylinder (10,r=10);
}
}
}
}
}
mirror([1,0,0]){
        translate([30,5,0]){
        scale([1.2,1.2,1]){
    difference(){
    difference(){
    scale([0.7,1,1]){
    cylinder (10,r=20);
       }
       translate([0,-50,0]){
       cylinder(10,r=40);
}
}
translate([-3,-5,0]){
scale([0.5,1,1]){
    cylinder (10,r=10);
}
}
}
}
}
}
}

//olho triste
else if (olhos_eyes=="triste_sad"){
    translate([30,5,0]){
        scale([1.2,1.2,1]){
    difference(){
    difference(){
    scale([0.7,1,1]){
    cylinder (10,r=20);
       }
       translate([0,50,0]){
       cylinder(10,r=40);
}
}
translate([-3,-15,0]){
scale([0.5,1,1]){
    cylinder (10,r=10);
}
}
}
}
}
mirror([1,0,0]){
        translate([30,5,0]){
        scale([1.2,1.2,1]){
    difference(){
    difference(){
    scale([0.7,1,1]){
    cylinder (10,r=20);
       }
       translate([0,50,0]){
       cylinder(10,r=40);
}
}
translate([-3,-15,0]){
scale([0.5,1,1]){
    cylinder (10,r=10);
}
}
}
}
}
}
}

//olho curioso
else if (olhos_eyes=="curioso_curious"){
    translate([30,5,0]){
        scale([1.2,1.2,1]){
    difference(){

    scale([0.7,1,1]){
    cylinder (10,r=20);
       }

translate([-10,-5,0]){
scale([0.5,1,1]){
    cylinder (10,r=10);
}
}
}
}
}
mirror([1,0,0]){
        translate([30,5,0]){
        scale([1.2,1.2,1]){
    difference(){
 
    scale([0.7,1,1]){
    cylinder (10,r=20);
       }
translate([10,-5,0]){
scale([0.5,1,1]){
    cylinder (10,r=10);
}
}
}
}
}
}
}
 }
 }
}
//end
}
